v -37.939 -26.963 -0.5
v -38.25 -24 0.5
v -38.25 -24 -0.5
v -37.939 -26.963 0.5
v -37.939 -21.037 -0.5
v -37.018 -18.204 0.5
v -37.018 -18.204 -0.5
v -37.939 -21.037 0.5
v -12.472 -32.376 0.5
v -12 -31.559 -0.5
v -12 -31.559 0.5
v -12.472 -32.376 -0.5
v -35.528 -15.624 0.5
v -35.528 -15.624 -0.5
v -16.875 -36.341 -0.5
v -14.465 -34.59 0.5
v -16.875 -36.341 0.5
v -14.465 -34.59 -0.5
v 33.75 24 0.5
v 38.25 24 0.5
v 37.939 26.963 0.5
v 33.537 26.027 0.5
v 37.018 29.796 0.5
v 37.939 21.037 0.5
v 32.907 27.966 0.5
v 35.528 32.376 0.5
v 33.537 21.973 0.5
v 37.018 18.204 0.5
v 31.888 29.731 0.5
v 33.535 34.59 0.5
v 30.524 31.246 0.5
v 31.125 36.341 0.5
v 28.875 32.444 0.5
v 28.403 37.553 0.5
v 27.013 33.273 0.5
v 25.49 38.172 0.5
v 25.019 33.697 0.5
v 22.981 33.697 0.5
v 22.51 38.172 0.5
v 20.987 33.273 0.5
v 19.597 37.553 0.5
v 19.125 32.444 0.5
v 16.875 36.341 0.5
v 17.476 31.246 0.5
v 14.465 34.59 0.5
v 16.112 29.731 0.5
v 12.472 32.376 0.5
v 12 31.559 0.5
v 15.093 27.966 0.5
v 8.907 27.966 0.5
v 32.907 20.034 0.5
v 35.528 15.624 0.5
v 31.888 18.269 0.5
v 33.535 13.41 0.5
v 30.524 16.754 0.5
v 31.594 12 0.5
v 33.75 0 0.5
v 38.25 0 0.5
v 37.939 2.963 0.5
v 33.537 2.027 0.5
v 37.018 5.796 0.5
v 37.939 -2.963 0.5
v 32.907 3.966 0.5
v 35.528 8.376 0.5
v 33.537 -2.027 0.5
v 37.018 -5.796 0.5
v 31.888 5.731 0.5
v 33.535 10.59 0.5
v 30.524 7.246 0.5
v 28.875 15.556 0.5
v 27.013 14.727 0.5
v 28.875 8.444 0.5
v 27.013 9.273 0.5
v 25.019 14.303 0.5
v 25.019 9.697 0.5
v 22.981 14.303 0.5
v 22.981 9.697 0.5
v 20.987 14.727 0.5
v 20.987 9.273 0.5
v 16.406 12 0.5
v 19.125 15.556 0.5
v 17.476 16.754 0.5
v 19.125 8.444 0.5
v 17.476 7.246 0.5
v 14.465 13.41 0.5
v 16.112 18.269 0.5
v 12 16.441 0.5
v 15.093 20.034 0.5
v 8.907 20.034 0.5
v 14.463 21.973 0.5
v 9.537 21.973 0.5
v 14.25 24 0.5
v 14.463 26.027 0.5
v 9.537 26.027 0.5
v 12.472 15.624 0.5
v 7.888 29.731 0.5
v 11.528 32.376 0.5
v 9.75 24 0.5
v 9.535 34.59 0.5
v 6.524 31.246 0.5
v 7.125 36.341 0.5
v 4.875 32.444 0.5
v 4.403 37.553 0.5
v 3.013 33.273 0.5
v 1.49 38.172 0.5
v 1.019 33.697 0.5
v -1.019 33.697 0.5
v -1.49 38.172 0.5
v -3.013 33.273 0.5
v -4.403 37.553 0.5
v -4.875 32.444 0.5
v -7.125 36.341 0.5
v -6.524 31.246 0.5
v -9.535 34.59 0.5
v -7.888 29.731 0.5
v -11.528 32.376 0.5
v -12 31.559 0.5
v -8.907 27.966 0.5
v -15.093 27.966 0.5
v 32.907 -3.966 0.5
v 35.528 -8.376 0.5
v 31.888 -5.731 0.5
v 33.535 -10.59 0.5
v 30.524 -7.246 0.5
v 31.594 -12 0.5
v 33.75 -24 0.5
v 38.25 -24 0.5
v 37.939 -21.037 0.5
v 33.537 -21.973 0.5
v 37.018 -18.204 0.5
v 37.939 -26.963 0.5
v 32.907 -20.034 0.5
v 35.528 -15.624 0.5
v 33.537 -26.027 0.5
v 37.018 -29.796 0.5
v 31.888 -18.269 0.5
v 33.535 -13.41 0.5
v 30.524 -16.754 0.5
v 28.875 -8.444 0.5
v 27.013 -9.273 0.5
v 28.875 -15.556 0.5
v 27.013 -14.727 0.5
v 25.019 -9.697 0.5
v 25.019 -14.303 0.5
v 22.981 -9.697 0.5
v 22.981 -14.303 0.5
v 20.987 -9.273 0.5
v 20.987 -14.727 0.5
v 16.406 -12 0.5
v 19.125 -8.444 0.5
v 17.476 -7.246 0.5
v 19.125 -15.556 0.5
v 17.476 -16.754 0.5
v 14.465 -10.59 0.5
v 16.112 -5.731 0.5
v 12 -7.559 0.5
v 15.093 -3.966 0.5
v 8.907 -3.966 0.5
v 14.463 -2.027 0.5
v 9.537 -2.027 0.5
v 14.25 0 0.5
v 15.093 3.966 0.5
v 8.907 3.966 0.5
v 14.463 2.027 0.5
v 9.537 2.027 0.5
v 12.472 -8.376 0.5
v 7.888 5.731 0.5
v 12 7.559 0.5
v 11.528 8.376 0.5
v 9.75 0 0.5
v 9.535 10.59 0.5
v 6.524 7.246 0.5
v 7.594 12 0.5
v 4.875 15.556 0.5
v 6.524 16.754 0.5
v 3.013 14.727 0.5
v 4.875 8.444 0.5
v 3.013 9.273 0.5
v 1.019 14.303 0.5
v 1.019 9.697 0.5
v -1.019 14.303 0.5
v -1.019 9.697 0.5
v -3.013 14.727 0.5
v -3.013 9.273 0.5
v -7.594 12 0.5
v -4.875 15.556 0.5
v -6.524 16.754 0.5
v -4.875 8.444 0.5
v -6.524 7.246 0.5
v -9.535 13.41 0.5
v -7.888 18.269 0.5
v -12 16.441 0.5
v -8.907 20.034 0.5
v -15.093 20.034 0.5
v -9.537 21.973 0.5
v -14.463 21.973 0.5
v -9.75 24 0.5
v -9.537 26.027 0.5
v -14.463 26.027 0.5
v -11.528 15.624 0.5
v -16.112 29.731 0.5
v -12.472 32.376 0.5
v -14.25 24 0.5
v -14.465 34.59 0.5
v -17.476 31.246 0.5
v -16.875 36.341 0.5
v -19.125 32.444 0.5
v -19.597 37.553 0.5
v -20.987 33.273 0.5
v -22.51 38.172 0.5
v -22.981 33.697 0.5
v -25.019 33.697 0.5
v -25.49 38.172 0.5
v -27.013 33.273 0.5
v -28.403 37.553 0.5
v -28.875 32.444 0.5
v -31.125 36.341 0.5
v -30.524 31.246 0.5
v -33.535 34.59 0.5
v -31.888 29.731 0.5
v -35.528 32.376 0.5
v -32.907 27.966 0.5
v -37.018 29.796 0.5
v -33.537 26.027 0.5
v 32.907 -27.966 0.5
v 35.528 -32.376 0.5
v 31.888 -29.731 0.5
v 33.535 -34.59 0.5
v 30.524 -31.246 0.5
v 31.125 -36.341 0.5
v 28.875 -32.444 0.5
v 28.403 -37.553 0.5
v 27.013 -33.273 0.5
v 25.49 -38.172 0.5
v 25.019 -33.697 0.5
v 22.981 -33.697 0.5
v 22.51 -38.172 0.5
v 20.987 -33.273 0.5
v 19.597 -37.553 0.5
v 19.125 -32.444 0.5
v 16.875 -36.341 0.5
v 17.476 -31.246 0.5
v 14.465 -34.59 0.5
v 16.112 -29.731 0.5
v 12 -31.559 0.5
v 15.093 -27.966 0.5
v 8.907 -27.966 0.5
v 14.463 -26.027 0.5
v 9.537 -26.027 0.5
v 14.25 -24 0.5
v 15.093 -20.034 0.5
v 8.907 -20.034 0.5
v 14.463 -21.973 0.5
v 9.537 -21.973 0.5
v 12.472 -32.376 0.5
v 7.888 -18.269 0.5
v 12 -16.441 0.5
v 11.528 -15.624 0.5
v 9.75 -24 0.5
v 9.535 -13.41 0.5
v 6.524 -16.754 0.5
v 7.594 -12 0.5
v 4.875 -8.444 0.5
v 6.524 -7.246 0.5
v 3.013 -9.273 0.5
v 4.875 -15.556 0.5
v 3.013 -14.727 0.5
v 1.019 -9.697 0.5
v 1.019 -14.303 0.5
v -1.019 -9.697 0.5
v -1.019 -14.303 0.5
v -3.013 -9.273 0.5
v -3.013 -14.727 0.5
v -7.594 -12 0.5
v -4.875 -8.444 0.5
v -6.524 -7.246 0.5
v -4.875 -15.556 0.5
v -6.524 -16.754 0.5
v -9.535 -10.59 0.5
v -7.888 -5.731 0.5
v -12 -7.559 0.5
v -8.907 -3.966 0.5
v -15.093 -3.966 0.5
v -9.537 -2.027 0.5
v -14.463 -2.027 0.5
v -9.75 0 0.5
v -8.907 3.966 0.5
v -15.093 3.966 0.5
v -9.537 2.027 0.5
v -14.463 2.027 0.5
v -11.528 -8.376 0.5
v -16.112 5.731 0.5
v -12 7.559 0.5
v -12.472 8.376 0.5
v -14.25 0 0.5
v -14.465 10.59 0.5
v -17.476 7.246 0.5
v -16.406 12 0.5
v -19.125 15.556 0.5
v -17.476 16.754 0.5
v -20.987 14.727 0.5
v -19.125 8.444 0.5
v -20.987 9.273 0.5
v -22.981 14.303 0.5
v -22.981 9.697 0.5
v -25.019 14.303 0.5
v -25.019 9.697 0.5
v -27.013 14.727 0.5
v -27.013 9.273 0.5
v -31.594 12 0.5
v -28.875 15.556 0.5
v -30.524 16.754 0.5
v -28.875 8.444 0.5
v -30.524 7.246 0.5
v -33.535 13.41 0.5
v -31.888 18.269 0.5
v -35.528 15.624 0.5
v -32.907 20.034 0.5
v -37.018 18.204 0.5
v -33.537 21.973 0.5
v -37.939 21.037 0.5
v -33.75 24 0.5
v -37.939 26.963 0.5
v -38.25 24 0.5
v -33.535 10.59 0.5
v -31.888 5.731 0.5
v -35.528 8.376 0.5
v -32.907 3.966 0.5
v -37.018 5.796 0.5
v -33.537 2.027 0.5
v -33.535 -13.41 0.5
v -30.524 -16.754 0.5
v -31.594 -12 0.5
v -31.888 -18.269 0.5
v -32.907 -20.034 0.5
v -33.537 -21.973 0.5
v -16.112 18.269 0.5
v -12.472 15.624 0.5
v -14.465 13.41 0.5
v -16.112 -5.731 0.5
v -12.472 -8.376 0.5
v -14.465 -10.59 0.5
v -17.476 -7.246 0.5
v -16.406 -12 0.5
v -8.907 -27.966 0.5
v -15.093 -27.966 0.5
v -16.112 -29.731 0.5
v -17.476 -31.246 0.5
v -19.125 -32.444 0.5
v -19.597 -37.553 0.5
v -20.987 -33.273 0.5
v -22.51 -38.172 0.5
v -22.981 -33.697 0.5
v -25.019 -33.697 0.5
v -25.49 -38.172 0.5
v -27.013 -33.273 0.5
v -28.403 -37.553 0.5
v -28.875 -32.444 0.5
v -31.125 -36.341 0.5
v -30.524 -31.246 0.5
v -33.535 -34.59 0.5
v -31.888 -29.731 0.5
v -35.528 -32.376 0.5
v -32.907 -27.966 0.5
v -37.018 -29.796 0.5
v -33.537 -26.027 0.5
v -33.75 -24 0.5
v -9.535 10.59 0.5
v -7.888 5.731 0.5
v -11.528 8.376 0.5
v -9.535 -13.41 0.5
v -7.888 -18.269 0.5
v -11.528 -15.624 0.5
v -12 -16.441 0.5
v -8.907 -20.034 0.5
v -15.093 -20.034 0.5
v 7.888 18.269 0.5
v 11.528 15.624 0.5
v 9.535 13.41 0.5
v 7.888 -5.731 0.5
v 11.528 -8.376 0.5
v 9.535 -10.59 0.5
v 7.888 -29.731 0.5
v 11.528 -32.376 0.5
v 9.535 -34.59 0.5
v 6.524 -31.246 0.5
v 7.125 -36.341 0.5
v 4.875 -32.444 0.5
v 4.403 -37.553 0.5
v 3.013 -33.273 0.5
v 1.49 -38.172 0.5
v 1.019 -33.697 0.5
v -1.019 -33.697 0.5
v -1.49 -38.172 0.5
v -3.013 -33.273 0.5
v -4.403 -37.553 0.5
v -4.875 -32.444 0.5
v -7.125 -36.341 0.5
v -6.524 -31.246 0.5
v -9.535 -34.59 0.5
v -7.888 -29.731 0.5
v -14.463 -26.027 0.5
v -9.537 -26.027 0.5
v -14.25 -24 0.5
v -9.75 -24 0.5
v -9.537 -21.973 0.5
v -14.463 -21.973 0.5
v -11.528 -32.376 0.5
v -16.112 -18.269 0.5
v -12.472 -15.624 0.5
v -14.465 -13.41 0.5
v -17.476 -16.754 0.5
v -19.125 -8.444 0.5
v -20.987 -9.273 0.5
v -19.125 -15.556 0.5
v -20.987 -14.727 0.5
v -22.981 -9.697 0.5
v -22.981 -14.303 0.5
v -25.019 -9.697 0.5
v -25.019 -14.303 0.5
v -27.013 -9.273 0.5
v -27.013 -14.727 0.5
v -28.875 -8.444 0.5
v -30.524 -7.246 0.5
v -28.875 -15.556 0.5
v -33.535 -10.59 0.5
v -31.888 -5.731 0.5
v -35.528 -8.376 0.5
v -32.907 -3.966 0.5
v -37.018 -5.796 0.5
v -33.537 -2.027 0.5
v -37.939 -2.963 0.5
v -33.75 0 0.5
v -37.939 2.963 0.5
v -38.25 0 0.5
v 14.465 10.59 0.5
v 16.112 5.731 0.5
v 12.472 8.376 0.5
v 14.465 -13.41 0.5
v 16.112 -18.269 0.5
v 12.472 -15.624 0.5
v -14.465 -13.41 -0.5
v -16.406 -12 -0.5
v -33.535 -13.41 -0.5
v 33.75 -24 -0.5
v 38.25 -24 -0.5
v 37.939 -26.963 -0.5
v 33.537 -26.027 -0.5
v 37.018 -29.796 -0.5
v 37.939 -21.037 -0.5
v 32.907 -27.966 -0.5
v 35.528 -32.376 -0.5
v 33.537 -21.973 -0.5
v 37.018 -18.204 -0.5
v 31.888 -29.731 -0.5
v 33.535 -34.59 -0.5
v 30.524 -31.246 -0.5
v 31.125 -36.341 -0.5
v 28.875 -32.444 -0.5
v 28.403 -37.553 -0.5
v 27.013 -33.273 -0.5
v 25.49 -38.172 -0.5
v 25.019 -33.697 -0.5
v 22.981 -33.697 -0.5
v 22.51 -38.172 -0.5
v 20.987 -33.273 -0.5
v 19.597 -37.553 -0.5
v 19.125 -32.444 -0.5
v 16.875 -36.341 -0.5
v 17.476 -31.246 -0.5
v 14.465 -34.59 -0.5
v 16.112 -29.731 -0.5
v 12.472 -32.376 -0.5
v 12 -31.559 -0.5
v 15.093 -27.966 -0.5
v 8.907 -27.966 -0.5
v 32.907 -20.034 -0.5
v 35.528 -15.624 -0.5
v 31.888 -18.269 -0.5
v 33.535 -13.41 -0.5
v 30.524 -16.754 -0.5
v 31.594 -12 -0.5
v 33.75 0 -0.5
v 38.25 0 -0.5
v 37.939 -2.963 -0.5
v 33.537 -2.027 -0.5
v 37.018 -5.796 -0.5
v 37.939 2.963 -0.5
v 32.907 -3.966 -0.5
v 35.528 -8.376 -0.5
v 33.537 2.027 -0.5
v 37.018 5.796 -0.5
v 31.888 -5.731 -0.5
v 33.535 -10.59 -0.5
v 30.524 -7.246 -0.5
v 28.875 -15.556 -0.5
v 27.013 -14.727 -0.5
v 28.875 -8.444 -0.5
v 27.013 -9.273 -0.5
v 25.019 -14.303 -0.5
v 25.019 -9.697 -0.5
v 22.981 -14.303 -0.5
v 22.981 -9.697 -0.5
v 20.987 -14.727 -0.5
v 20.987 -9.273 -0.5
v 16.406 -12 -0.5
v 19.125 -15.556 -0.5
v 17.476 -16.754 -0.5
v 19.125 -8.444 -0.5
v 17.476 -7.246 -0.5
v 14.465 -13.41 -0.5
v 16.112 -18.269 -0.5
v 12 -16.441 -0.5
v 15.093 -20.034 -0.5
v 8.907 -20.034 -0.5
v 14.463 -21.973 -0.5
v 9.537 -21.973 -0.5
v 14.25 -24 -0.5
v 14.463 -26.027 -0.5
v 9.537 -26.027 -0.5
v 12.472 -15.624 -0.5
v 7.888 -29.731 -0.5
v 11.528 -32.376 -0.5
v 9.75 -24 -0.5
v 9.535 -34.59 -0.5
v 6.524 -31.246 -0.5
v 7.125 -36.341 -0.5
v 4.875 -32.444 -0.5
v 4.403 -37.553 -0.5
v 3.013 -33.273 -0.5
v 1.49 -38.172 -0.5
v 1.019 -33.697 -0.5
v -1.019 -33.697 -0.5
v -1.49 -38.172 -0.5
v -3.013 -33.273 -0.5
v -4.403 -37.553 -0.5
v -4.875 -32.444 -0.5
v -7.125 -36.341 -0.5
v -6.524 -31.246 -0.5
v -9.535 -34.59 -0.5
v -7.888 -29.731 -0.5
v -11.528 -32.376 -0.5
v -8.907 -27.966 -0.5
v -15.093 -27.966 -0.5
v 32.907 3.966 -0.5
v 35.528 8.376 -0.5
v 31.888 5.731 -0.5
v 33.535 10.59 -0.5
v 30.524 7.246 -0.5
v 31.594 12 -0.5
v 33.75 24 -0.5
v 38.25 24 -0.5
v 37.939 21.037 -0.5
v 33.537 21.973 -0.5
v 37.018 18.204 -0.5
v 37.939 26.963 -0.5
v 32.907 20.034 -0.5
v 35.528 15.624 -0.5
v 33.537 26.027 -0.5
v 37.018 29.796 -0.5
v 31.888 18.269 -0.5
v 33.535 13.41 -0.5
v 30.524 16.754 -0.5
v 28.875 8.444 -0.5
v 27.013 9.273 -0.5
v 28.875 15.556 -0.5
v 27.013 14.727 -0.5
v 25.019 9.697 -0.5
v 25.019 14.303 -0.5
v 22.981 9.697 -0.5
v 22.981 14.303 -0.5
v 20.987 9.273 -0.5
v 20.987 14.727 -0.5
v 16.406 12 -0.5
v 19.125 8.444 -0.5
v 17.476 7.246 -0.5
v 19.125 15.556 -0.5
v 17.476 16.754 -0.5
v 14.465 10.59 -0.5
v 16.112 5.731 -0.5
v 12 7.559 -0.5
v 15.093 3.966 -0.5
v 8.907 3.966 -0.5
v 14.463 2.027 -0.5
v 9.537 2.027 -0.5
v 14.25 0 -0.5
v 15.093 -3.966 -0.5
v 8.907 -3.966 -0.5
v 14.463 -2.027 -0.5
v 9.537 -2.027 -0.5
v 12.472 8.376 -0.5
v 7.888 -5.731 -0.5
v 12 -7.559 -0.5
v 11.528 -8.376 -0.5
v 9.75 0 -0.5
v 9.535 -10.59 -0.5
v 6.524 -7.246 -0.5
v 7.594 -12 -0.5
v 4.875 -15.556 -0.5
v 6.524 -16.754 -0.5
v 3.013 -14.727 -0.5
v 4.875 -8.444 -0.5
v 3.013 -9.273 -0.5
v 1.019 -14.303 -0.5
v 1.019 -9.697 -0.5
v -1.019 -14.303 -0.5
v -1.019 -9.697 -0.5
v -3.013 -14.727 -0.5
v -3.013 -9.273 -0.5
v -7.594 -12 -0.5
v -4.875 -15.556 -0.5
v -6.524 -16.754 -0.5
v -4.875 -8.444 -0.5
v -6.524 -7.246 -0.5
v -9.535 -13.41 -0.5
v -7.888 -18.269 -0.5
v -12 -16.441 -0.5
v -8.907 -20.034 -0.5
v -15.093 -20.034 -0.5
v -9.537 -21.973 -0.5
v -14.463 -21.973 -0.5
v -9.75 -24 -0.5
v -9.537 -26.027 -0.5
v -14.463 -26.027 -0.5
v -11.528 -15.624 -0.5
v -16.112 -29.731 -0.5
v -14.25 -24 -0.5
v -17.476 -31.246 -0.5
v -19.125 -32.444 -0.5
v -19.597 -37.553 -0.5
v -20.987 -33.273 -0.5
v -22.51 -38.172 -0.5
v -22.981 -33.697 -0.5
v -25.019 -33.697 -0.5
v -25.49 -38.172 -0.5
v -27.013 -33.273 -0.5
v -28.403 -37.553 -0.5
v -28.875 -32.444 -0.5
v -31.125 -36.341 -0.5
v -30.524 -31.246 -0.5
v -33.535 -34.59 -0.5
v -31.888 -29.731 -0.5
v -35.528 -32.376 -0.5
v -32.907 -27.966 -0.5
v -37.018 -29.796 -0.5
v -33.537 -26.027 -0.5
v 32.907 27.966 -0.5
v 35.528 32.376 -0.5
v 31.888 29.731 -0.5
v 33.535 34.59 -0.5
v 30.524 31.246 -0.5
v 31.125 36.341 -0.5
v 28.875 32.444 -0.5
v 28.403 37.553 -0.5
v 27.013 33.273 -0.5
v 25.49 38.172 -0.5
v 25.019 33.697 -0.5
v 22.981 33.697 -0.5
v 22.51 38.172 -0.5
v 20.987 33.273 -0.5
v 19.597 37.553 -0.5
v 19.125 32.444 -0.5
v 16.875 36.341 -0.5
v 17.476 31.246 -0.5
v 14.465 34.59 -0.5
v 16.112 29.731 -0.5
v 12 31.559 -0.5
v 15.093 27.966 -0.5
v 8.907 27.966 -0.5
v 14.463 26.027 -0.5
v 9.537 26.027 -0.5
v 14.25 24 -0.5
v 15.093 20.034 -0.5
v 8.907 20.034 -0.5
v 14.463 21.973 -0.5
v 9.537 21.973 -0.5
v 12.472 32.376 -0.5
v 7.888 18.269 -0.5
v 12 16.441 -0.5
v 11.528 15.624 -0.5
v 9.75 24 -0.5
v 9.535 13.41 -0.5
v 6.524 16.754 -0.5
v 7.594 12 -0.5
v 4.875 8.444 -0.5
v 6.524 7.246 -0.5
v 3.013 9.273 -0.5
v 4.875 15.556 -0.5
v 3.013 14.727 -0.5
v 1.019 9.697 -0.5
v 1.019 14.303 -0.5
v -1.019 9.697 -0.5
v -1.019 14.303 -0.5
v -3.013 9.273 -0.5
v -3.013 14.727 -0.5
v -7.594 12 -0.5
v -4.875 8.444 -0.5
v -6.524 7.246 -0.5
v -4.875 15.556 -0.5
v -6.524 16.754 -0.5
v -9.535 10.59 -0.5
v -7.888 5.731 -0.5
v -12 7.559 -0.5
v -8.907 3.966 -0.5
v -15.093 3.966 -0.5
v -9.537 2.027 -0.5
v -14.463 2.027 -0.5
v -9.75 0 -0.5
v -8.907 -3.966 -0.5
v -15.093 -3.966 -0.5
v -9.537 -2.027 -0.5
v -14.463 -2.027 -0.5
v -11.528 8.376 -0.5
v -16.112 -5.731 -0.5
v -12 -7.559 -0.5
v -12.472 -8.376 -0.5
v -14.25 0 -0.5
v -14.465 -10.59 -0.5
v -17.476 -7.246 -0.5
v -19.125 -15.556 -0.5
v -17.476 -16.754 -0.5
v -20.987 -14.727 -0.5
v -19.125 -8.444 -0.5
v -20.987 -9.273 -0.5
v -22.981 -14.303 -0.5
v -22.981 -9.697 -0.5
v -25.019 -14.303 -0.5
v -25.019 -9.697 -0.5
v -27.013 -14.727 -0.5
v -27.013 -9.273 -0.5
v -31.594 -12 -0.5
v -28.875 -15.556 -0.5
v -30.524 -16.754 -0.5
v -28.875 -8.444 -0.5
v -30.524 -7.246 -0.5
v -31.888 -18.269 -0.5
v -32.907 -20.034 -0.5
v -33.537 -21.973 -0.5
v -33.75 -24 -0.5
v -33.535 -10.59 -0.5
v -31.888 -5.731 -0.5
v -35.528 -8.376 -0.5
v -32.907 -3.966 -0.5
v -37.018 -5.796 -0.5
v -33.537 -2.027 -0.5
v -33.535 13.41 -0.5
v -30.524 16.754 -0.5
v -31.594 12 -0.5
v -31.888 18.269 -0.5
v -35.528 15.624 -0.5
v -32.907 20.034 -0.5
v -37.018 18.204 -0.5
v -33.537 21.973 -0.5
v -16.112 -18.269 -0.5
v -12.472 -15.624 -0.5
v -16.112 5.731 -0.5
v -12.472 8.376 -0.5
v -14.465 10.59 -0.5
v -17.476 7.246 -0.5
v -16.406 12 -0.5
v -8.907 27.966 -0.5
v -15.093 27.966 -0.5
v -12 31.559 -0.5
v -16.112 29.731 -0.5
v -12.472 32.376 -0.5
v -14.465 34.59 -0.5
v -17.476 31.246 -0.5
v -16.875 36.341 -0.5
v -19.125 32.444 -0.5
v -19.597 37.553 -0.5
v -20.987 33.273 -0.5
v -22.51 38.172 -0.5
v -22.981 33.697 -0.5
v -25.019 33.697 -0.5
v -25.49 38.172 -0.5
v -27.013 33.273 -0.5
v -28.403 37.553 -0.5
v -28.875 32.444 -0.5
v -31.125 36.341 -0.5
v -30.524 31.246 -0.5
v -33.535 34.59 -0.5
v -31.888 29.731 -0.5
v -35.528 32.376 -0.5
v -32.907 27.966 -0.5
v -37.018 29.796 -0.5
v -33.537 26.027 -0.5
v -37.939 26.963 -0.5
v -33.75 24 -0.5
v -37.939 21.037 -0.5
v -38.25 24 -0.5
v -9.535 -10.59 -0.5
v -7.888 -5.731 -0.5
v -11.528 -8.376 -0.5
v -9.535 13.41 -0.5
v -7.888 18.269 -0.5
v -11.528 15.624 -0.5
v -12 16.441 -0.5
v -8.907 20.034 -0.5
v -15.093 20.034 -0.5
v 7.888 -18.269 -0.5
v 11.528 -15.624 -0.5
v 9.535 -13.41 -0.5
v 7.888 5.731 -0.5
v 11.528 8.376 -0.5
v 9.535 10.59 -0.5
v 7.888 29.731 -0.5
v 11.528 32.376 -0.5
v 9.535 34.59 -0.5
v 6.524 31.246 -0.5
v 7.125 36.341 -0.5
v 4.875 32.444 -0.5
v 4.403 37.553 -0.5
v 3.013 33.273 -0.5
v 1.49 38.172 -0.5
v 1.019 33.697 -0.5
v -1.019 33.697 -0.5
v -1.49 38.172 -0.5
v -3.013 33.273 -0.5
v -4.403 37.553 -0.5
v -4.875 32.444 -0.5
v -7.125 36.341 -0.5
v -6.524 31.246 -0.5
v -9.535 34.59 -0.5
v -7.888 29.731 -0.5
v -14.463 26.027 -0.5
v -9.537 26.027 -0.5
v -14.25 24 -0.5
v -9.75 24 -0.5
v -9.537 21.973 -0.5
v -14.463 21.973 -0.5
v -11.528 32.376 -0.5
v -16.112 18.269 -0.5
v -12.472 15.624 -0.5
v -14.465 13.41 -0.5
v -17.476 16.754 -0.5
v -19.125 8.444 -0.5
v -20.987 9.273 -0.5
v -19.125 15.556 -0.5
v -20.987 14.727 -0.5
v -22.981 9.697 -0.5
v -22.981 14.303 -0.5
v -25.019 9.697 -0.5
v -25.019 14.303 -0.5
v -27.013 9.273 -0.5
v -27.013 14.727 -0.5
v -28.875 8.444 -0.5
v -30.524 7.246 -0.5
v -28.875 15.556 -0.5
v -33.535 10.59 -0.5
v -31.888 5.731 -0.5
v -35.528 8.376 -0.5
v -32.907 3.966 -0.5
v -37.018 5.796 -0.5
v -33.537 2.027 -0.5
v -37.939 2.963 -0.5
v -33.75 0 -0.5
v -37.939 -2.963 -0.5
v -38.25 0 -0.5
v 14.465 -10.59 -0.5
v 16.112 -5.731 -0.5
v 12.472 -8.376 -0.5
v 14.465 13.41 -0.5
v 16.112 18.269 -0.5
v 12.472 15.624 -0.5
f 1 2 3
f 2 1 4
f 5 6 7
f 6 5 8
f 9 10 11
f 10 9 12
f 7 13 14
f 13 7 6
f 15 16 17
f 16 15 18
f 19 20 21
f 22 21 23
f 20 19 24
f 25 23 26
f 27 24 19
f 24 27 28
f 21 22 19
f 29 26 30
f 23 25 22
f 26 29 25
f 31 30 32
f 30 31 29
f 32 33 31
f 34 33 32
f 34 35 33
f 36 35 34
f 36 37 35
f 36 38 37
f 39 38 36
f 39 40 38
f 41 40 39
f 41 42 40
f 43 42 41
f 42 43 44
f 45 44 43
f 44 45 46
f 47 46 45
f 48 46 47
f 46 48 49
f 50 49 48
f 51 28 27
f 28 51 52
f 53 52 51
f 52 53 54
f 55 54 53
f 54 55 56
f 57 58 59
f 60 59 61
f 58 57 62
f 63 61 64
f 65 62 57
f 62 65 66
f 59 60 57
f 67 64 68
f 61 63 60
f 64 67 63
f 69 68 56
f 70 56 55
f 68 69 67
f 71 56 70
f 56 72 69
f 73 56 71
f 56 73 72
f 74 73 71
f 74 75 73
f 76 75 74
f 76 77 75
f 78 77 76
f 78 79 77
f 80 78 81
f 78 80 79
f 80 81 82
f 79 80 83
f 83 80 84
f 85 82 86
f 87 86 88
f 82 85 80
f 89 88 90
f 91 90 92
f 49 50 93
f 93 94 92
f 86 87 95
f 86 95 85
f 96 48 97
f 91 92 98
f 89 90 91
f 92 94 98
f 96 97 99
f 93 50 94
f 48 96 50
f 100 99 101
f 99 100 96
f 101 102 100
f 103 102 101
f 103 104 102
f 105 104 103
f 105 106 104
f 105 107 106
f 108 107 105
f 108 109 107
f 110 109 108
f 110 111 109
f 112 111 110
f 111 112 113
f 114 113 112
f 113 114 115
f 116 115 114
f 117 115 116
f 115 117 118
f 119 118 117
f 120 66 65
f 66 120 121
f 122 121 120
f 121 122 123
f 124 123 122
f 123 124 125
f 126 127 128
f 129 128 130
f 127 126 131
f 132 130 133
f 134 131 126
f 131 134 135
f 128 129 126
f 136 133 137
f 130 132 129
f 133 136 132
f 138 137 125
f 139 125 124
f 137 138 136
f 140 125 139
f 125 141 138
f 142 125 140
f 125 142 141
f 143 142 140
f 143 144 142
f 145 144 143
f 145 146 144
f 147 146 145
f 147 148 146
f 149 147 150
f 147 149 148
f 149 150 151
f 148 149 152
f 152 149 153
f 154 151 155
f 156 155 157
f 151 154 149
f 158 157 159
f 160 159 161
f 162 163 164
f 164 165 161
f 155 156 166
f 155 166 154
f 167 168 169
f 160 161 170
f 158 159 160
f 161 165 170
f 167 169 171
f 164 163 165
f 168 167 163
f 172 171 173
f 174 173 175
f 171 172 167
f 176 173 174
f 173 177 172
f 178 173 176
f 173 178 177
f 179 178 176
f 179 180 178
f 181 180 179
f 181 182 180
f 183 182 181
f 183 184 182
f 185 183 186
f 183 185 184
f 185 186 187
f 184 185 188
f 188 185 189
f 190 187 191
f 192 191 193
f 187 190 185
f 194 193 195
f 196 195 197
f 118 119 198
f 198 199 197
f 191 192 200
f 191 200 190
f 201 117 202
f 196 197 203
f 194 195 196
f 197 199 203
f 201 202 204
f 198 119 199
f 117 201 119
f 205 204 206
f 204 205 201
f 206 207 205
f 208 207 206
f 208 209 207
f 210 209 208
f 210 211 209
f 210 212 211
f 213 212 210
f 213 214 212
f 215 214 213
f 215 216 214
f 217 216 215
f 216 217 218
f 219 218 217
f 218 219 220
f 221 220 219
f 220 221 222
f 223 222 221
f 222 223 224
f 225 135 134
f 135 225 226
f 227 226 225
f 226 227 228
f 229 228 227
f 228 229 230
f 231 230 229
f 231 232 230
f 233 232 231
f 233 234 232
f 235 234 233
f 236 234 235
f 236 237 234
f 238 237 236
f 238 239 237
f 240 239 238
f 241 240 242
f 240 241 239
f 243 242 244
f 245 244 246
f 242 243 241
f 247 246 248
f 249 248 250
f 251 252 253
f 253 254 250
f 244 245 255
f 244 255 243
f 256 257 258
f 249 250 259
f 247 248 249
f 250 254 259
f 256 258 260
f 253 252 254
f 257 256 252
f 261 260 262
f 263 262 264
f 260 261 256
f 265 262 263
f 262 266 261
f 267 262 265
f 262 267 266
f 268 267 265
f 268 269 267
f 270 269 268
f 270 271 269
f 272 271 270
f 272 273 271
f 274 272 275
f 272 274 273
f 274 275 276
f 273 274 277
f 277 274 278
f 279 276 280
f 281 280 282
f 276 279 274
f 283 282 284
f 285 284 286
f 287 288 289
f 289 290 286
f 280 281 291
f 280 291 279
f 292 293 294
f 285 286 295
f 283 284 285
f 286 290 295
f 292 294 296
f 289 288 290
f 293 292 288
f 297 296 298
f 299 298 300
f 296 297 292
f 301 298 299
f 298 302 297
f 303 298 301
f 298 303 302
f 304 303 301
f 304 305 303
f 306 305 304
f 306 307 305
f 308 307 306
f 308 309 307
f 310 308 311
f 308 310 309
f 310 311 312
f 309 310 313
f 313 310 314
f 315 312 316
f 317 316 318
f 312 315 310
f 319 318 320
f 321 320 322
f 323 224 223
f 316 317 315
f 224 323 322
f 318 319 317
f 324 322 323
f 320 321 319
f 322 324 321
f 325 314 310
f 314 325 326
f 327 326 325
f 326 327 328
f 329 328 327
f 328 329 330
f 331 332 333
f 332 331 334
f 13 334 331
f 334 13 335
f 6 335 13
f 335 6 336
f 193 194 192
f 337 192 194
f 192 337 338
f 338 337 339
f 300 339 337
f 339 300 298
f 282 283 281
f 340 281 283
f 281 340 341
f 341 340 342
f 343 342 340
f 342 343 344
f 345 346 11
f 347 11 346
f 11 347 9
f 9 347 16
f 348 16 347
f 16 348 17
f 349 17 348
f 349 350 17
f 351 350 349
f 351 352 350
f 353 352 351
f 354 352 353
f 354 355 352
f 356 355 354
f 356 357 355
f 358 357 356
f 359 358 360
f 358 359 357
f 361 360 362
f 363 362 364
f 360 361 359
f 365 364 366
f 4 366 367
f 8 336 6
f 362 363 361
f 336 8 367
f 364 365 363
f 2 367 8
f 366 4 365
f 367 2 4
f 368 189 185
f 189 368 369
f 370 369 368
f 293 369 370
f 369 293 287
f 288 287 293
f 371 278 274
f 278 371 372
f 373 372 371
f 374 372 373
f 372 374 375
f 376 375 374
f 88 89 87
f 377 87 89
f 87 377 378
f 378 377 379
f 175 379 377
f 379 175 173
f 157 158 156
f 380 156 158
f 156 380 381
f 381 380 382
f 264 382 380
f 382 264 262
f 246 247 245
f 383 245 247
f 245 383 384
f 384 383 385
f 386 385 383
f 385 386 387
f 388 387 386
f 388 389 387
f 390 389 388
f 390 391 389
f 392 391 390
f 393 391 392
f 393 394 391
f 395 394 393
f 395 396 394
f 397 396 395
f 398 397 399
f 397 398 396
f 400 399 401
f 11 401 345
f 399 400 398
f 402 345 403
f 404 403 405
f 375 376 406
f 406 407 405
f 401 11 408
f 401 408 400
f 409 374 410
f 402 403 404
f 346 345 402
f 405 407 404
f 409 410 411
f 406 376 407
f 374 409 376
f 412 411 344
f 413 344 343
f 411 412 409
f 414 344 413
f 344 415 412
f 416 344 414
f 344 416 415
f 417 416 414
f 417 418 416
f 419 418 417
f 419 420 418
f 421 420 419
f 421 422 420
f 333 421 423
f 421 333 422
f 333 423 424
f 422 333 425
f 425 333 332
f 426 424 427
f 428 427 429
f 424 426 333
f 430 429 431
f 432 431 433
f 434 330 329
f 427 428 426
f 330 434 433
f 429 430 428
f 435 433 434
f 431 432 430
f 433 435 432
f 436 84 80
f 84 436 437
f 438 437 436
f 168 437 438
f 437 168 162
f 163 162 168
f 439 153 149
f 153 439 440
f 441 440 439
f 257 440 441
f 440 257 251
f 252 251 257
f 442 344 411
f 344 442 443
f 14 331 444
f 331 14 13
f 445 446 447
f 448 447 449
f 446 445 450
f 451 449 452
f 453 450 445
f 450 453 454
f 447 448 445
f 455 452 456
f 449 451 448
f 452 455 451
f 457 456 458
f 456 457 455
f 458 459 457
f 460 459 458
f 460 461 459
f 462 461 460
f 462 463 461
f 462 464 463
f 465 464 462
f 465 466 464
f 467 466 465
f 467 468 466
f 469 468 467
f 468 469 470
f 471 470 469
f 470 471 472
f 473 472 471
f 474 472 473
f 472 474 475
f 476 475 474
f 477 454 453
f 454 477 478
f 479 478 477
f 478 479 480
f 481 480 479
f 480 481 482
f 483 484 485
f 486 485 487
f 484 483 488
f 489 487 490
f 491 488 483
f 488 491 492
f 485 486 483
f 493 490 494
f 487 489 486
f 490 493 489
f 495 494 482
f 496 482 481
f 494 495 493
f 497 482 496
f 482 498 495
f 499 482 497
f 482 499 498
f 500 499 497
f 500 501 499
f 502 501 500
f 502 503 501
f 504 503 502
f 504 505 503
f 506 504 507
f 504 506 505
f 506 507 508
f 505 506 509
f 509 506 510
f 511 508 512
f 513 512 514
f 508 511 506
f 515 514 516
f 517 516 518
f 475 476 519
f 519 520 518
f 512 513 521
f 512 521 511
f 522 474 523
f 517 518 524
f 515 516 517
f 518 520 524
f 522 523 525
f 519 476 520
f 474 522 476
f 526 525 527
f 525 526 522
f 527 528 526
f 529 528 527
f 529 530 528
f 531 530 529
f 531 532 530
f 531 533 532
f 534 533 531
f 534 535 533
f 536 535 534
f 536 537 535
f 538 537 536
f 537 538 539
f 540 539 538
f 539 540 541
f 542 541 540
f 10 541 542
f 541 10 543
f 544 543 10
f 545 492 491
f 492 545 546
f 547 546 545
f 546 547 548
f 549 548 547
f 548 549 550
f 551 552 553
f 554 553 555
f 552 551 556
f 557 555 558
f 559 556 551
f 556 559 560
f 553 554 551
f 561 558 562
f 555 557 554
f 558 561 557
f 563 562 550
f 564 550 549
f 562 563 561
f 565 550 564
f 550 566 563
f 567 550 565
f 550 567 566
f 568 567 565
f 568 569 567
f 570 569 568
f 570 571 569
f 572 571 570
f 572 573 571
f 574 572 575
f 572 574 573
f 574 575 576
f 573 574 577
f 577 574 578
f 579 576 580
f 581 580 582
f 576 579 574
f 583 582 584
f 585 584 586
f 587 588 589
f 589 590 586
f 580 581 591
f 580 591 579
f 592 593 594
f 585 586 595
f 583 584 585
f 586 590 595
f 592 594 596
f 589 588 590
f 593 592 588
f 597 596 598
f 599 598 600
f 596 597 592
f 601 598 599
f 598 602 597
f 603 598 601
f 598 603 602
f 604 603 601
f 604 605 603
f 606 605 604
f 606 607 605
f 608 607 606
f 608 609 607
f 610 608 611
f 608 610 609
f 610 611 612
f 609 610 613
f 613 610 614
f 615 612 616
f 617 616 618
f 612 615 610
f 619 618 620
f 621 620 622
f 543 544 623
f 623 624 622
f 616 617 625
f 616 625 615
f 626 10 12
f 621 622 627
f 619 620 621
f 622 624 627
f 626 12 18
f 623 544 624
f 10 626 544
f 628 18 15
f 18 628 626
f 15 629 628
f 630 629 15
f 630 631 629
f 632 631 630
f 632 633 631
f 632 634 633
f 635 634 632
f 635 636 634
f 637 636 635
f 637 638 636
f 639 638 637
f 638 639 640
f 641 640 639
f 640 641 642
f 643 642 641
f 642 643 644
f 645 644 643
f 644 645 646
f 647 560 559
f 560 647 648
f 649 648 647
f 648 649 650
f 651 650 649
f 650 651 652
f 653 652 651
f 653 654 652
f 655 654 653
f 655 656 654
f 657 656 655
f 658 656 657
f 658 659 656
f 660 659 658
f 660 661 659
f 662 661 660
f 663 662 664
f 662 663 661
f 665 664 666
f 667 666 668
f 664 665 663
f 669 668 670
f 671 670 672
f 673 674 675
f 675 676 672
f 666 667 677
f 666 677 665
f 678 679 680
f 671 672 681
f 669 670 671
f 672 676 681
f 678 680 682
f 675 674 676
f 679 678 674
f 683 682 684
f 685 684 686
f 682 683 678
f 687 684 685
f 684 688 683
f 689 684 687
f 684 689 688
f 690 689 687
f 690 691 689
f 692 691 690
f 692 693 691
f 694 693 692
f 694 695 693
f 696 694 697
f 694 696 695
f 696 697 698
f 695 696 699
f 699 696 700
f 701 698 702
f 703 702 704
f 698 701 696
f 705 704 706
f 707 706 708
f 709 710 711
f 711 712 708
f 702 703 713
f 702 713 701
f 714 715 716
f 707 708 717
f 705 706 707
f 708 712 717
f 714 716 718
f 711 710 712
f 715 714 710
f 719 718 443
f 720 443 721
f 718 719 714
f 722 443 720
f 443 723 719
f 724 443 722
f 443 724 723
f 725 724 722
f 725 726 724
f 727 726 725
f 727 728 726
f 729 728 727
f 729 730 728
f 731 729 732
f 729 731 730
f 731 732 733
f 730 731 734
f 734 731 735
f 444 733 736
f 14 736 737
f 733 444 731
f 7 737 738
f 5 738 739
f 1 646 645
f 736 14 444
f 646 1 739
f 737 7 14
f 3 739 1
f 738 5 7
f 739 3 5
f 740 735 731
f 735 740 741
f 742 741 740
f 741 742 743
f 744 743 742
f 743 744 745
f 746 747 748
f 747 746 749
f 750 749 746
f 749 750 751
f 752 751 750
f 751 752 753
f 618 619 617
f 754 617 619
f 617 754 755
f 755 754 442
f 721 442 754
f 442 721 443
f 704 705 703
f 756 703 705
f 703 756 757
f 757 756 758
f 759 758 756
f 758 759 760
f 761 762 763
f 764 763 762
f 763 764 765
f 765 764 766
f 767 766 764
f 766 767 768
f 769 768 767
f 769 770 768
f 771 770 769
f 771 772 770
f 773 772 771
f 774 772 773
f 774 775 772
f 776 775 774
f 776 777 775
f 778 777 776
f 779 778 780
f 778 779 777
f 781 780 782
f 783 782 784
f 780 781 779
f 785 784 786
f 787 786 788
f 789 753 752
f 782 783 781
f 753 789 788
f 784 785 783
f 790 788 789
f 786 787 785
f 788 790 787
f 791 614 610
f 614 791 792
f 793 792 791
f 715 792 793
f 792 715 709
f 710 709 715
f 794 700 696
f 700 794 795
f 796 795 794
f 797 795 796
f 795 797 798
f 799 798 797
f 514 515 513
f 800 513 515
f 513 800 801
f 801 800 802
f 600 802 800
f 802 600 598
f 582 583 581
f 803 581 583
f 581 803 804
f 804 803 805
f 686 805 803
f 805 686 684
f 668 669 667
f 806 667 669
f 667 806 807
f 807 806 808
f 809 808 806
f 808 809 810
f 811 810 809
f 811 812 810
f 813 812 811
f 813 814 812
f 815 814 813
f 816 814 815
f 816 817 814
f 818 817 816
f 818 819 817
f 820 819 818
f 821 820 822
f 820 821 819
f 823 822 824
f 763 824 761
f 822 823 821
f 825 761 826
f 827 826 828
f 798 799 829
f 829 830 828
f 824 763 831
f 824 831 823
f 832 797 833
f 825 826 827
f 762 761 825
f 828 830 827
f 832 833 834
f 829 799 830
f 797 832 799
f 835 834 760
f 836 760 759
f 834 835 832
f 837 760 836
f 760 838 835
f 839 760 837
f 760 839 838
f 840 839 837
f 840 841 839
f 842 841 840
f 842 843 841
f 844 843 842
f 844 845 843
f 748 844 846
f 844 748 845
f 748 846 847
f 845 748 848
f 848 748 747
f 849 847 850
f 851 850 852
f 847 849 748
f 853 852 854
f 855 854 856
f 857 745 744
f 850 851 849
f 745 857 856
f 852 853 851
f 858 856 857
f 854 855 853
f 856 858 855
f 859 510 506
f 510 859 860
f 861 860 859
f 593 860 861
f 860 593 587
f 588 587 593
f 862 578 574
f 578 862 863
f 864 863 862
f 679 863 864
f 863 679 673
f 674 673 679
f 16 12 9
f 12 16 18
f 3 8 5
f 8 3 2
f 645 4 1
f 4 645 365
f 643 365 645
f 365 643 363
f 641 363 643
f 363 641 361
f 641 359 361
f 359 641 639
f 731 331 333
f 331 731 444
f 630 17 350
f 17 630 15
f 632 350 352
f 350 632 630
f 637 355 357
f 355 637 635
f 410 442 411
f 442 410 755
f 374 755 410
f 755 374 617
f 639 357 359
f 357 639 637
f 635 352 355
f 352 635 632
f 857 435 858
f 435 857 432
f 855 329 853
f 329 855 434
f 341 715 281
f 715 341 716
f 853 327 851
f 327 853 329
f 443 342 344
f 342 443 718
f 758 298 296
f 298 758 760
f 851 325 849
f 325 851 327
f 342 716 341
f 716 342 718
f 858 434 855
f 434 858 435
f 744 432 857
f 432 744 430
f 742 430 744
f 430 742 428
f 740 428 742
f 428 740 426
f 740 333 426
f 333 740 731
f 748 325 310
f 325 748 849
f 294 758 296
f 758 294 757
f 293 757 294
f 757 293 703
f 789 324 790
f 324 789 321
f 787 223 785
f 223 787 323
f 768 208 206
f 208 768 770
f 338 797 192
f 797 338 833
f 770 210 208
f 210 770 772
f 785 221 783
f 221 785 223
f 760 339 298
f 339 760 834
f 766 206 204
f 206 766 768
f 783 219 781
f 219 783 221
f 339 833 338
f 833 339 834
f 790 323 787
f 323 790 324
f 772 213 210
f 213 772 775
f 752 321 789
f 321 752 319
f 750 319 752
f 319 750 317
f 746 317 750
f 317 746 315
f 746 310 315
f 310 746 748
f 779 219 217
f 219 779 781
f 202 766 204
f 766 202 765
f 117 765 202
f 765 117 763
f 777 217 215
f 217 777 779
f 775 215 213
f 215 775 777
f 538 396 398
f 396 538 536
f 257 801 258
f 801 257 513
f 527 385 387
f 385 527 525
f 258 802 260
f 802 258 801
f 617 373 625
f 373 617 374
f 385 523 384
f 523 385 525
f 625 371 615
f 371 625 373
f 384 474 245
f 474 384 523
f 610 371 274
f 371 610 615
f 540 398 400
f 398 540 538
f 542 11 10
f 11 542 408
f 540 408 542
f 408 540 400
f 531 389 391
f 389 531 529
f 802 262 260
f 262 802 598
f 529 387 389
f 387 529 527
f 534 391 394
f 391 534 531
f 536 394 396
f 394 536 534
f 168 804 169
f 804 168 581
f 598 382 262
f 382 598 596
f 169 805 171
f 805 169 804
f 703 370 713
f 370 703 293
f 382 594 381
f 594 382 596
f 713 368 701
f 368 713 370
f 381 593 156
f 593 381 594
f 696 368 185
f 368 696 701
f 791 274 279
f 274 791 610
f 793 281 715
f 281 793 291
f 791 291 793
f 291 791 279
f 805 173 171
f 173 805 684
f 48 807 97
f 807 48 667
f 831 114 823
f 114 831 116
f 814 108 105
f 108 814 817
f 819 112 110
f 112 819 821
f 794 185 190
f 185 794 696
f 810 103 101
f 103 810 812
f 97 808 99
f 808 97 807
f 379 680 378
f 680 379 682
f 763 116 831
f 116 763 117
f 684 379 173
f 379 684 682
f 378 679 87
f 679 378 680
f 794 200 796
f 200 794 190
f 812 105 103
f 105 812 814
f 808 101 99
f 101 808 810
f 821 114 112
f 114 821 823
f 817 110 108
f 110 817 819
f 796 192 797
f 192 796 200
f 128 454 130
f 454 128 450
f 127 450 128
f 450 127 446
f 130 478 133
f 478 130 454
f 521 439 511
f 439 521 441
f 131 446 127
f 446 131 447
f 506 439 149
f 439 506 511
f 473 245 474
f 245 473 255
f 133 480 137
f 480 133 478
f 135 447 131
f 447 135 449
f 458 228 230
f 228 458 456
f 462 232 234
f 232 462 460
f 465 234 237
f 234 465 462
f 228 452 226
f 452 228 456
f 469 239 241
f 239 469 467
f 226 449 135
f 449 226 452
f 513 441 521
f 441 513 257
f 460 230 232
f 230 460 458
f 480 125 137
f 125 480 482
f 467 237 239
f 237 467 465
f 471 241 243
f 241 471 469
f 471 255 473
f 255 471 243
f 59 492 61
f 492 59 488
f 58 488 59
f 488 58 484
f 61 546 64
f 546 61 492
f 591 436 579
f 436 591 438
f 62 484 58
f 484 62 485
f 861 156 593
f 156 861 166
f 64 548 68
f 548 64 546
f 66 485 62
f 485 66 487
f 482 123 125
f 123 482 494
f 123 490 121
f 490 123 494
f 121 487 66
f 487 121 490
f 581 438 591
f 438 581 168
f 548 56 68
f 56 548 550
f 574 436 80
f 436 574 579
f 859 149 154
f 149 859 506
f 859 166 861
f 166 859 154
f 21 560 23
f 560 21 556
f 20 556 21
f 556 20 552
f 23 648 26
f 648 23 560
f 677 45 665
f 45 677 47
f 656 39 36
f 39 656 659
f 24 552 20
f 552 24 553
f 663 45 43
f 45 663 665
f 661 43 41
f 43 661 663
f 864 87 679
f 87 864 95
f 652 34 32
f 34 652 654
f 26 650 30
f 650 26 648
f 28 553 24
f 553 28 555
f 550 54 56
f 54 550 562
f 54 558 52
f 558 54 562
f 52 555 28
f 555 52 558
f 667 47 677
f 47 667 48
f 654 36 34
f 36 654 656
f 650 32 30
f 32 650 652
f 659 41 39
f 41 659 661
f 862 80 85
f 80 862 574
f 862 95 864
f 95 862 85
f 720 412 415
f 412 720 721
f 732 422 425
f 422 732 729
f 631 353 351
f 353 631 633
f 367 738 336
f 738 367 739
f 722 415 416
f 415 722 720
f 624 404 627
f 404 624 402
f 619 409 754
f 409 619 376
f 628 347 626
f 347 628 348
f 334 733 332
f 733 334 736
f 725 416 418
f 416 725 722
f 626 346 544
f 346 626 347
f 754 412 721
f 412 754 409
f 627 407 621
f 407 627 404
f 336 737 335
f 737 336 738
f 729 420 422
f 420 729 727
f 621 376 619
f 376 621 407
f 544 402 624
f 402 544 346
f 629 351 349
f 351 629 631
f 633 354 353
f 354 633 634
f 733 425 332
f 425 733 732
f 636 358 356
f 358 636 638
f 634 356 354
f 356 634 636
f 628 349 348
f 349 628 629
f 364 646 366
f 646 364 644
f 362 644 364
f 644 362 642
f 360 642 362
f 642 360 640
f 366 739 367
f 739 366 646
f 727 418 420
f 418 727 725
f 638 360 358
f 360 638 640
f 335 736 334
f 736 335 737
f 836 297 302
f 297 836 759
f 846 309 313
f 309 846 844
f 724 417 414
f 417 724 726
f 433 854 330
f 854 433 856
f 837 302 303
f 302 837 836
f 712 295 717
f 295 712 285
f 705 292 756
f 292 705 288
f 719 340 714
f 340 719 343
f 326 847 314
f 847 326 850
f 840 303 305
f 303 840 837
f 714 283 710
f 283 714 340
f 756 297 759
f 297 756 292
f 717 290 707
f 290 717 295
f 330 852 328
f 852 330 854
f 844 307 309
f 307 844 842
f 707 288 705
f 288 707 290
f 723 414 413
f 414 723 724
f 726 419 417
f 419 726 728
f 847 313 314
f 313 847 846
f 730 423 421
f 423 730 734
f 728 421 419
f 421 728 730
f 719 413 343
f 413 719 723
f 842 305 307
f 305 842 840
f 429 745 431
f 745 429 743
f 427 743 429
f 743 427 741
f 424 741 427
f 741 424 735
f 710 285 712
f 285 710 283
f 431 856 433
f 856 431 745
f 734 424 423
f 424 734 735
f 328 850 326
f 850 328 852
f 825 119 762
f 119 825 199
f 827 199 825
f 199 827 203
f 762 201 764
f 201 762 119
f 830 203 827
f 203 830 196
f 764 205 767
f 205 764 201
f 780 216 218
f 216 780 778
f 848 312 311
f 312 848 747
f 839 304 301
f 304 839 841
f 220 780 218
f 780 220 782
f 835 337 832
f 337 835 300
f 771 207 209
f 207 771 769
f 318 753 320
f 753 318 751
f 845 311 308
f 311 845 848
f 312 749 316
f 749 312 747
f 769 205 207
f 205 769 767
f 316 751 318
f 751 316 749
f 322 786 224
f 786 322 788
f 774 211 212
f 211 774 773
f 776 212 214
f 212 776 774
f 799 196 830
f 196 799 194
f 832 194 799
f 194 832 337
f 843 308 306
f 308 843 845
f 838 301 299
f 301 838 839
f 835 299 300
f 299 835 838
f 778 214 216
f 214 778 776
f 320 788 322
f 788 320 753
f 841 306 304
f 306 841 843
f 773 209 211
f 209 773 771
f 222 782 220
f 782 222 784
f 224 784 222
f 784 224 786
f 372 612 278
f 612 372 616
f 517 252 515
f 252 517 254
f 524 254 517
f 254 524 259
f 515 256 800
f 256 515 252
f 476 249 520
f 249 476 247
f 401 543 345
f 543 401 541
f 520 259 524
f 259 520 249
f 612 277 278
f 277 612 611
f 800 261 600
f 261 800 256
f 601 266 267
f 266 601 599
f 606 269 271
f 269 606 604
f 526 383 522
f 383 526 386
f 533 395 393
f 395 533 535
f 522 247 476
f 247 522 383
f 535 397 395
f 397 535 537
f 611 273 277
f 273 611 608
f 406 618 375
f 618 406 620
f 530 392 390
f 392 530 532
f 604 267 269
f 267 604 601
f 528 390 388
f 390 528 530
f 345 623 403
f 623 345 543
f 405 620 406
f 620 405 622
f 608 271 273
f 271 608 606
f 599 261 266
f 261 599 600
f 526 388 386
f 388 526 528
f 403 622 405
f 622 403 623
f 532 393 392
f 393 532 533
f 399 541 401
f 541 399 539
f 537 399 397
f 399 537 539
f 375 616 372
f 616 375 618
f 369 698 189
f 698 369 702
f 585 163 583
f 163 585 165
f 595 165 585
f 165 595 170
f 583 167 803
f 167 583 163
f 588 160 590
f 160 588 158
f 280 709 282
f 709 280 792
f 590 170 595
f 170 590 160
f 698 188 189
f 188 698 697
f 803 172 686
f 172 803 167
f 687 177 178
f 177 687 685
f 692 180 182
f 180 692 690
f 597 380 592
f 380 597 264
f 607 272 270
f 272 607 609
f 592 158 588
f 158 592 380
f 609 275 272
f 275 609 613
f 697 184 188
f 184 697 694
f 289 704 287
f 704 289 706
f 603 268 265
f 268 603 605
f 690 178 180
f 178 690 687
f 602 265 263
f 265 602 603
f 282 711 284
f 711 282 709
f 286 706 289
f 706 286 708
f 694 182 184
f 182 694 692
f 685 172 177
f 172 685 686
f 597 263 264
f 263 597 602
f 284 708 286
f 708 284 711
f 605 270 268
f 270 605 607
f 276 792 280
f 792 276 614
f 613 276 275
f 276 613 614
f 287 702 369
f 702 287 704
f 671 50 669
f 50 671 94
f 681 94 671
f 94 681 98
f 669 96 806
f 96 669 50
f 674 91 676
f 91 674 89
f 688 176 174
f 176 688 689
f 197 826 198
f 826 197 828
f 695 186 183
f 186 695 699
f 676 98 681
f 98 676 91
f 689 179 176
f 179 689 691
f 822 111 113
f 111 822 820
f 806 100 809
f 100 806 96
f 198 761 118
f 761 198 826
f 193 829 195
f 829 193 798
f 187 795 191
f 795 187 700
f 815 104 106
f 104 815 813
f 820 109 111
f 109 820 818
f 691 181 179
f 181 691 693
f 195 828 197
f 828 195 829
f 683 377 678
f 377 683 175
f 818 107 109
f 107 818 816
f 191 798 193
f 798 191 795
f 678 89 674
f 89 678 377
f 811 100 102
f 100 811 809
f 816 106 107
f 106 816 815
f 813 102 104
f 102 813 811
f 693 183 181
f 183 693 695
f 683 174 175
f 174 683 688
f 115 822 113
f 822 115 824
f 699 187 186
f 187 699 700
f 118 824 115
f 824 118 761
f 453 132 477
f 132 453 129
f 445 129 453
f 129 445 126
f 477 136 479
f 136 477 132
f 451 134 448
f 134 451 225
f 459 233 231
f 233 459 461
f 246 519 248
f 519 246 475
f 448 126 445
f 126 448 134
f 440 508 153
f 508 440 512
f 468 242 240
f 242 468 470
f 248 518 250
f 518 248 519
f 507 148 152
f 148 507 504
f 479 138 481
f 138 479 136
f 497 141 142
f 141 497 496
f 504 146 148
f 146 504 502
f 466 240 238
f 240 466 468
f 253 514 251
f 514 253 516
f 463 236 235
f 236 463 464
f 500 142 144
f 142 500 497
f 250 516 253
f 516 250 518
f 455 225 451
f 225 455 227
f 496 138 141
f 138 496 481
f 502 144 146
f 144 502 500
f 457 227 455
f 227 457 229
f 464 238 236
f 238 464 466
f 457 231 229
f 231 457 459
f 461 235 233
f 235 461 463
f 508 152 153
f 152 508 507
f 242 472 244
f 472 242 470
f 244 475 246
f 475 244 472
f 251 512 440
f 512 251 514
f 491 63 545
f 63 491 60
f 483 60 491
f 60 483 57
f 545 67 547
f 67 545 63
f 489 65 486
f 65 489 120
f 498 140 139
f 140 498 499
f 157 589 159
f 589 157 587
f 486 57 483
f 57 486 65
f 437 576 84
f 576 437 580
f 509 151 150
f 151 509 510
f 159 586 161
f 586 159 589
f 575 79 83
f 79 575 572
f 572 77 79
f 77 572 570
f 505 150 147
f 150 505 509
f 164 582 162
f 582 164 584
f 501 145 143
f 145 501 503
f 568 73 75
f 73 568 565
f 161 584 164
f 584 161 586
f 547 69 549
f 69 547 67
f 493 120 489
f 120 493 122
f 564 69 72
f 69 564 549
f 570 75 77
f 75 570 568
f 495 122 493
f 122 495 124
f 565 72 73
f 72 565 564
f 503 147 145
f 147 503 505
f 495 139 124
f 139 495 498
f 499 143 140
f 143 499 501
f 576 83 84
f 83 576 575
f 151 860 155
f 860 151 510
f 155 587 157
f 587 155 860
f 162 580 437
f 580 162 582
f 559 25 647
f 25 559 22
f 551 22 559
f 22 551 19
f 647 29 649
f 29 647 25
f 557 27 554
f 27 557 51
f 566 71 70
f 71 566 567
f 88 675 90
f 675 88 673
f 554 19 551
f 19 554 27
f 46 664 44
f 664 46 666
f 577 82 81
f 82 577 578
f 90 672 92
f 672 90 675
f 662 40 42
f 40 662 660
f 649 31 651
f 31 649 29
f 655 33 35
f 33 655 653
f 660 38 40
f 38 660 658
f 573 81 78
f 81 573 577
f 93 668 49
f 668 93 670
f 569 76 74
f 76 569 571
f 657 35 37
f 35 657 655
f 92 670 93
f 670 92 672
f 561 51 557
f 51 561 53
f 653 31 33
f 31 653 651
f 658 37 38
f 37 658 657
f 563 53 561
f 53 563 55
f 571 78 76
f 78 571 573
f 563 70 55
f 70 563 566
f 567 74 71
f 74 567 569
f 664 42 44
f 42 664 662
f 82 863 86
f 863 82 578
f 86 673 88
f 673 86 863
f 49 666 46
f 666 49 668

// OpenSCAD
//_______________________________________________
//                                         CONFIG
// Platform
well_size = 70;
well_depth = 0;
wall_width=1;
floor_depth=1;

// Tube holes
upperHoleDiameter=19.5;
//upperHoleSpacing=6;
spacing=24; // center to center

//_______________________________________________
//                                     CALCULATED
// Platform
block_size = well_size + wall_width*2;
block_height = well_depth + floor_depth ;


module tubeplatform(){
  union() {
    for (x = [-spacing:spacing:spacing]) {
	  for (y = [-spacing:spacing:spacing]) {
		translate(v=[x,y,-block_height/2]) 
//			cylinder(r=upperHoleDiameter/2+1,h=block_height);
			cylinder(r=(spacing+spacing-upperHoleDiameter)/2,h=block_height);
	  }
    }
  }
}

module tubeholes(){
  union() {
    for (x = [-spacing:spacing:spacing]) {
	  for (y = [-spacing:spacing:spacing]) {
		translate(v=[x,y,-block_height/2-1]) cylinder(r=upperHoleDiameter/2,h=block_height+4);
	  }
    }
  }
}

module top_middle(depth){
  difference(){
	 union() {
		tubeplatform();
	  }
	  tubeholes();
	}
}

module fencing() {
  r=5;
  union() {
    for (x = [-spacing*1.2:r:spacing*1.2+r]) {
	  for (y = [-spacing:r:spacing+r]) {
		translate(v=[0,x,y]) 
			rotate([45,0,0])
				cube([well_size*2, r/2, r/2], true);
	  }
    }

    for (x = [-spacing*1.2:r:spacing*1.2+r]) {
	  for (y = [-spacing:r:spacing+r]) {
		translate(v=[x,0,y]) 
			rotate([0,45,0])
				cube([r/2, well_size*2, r/2], true);
	  }
    }
  }
}

module top(){
	top_middle(floor_depth);
}


difference() {
   top();
//   fencing();
}
